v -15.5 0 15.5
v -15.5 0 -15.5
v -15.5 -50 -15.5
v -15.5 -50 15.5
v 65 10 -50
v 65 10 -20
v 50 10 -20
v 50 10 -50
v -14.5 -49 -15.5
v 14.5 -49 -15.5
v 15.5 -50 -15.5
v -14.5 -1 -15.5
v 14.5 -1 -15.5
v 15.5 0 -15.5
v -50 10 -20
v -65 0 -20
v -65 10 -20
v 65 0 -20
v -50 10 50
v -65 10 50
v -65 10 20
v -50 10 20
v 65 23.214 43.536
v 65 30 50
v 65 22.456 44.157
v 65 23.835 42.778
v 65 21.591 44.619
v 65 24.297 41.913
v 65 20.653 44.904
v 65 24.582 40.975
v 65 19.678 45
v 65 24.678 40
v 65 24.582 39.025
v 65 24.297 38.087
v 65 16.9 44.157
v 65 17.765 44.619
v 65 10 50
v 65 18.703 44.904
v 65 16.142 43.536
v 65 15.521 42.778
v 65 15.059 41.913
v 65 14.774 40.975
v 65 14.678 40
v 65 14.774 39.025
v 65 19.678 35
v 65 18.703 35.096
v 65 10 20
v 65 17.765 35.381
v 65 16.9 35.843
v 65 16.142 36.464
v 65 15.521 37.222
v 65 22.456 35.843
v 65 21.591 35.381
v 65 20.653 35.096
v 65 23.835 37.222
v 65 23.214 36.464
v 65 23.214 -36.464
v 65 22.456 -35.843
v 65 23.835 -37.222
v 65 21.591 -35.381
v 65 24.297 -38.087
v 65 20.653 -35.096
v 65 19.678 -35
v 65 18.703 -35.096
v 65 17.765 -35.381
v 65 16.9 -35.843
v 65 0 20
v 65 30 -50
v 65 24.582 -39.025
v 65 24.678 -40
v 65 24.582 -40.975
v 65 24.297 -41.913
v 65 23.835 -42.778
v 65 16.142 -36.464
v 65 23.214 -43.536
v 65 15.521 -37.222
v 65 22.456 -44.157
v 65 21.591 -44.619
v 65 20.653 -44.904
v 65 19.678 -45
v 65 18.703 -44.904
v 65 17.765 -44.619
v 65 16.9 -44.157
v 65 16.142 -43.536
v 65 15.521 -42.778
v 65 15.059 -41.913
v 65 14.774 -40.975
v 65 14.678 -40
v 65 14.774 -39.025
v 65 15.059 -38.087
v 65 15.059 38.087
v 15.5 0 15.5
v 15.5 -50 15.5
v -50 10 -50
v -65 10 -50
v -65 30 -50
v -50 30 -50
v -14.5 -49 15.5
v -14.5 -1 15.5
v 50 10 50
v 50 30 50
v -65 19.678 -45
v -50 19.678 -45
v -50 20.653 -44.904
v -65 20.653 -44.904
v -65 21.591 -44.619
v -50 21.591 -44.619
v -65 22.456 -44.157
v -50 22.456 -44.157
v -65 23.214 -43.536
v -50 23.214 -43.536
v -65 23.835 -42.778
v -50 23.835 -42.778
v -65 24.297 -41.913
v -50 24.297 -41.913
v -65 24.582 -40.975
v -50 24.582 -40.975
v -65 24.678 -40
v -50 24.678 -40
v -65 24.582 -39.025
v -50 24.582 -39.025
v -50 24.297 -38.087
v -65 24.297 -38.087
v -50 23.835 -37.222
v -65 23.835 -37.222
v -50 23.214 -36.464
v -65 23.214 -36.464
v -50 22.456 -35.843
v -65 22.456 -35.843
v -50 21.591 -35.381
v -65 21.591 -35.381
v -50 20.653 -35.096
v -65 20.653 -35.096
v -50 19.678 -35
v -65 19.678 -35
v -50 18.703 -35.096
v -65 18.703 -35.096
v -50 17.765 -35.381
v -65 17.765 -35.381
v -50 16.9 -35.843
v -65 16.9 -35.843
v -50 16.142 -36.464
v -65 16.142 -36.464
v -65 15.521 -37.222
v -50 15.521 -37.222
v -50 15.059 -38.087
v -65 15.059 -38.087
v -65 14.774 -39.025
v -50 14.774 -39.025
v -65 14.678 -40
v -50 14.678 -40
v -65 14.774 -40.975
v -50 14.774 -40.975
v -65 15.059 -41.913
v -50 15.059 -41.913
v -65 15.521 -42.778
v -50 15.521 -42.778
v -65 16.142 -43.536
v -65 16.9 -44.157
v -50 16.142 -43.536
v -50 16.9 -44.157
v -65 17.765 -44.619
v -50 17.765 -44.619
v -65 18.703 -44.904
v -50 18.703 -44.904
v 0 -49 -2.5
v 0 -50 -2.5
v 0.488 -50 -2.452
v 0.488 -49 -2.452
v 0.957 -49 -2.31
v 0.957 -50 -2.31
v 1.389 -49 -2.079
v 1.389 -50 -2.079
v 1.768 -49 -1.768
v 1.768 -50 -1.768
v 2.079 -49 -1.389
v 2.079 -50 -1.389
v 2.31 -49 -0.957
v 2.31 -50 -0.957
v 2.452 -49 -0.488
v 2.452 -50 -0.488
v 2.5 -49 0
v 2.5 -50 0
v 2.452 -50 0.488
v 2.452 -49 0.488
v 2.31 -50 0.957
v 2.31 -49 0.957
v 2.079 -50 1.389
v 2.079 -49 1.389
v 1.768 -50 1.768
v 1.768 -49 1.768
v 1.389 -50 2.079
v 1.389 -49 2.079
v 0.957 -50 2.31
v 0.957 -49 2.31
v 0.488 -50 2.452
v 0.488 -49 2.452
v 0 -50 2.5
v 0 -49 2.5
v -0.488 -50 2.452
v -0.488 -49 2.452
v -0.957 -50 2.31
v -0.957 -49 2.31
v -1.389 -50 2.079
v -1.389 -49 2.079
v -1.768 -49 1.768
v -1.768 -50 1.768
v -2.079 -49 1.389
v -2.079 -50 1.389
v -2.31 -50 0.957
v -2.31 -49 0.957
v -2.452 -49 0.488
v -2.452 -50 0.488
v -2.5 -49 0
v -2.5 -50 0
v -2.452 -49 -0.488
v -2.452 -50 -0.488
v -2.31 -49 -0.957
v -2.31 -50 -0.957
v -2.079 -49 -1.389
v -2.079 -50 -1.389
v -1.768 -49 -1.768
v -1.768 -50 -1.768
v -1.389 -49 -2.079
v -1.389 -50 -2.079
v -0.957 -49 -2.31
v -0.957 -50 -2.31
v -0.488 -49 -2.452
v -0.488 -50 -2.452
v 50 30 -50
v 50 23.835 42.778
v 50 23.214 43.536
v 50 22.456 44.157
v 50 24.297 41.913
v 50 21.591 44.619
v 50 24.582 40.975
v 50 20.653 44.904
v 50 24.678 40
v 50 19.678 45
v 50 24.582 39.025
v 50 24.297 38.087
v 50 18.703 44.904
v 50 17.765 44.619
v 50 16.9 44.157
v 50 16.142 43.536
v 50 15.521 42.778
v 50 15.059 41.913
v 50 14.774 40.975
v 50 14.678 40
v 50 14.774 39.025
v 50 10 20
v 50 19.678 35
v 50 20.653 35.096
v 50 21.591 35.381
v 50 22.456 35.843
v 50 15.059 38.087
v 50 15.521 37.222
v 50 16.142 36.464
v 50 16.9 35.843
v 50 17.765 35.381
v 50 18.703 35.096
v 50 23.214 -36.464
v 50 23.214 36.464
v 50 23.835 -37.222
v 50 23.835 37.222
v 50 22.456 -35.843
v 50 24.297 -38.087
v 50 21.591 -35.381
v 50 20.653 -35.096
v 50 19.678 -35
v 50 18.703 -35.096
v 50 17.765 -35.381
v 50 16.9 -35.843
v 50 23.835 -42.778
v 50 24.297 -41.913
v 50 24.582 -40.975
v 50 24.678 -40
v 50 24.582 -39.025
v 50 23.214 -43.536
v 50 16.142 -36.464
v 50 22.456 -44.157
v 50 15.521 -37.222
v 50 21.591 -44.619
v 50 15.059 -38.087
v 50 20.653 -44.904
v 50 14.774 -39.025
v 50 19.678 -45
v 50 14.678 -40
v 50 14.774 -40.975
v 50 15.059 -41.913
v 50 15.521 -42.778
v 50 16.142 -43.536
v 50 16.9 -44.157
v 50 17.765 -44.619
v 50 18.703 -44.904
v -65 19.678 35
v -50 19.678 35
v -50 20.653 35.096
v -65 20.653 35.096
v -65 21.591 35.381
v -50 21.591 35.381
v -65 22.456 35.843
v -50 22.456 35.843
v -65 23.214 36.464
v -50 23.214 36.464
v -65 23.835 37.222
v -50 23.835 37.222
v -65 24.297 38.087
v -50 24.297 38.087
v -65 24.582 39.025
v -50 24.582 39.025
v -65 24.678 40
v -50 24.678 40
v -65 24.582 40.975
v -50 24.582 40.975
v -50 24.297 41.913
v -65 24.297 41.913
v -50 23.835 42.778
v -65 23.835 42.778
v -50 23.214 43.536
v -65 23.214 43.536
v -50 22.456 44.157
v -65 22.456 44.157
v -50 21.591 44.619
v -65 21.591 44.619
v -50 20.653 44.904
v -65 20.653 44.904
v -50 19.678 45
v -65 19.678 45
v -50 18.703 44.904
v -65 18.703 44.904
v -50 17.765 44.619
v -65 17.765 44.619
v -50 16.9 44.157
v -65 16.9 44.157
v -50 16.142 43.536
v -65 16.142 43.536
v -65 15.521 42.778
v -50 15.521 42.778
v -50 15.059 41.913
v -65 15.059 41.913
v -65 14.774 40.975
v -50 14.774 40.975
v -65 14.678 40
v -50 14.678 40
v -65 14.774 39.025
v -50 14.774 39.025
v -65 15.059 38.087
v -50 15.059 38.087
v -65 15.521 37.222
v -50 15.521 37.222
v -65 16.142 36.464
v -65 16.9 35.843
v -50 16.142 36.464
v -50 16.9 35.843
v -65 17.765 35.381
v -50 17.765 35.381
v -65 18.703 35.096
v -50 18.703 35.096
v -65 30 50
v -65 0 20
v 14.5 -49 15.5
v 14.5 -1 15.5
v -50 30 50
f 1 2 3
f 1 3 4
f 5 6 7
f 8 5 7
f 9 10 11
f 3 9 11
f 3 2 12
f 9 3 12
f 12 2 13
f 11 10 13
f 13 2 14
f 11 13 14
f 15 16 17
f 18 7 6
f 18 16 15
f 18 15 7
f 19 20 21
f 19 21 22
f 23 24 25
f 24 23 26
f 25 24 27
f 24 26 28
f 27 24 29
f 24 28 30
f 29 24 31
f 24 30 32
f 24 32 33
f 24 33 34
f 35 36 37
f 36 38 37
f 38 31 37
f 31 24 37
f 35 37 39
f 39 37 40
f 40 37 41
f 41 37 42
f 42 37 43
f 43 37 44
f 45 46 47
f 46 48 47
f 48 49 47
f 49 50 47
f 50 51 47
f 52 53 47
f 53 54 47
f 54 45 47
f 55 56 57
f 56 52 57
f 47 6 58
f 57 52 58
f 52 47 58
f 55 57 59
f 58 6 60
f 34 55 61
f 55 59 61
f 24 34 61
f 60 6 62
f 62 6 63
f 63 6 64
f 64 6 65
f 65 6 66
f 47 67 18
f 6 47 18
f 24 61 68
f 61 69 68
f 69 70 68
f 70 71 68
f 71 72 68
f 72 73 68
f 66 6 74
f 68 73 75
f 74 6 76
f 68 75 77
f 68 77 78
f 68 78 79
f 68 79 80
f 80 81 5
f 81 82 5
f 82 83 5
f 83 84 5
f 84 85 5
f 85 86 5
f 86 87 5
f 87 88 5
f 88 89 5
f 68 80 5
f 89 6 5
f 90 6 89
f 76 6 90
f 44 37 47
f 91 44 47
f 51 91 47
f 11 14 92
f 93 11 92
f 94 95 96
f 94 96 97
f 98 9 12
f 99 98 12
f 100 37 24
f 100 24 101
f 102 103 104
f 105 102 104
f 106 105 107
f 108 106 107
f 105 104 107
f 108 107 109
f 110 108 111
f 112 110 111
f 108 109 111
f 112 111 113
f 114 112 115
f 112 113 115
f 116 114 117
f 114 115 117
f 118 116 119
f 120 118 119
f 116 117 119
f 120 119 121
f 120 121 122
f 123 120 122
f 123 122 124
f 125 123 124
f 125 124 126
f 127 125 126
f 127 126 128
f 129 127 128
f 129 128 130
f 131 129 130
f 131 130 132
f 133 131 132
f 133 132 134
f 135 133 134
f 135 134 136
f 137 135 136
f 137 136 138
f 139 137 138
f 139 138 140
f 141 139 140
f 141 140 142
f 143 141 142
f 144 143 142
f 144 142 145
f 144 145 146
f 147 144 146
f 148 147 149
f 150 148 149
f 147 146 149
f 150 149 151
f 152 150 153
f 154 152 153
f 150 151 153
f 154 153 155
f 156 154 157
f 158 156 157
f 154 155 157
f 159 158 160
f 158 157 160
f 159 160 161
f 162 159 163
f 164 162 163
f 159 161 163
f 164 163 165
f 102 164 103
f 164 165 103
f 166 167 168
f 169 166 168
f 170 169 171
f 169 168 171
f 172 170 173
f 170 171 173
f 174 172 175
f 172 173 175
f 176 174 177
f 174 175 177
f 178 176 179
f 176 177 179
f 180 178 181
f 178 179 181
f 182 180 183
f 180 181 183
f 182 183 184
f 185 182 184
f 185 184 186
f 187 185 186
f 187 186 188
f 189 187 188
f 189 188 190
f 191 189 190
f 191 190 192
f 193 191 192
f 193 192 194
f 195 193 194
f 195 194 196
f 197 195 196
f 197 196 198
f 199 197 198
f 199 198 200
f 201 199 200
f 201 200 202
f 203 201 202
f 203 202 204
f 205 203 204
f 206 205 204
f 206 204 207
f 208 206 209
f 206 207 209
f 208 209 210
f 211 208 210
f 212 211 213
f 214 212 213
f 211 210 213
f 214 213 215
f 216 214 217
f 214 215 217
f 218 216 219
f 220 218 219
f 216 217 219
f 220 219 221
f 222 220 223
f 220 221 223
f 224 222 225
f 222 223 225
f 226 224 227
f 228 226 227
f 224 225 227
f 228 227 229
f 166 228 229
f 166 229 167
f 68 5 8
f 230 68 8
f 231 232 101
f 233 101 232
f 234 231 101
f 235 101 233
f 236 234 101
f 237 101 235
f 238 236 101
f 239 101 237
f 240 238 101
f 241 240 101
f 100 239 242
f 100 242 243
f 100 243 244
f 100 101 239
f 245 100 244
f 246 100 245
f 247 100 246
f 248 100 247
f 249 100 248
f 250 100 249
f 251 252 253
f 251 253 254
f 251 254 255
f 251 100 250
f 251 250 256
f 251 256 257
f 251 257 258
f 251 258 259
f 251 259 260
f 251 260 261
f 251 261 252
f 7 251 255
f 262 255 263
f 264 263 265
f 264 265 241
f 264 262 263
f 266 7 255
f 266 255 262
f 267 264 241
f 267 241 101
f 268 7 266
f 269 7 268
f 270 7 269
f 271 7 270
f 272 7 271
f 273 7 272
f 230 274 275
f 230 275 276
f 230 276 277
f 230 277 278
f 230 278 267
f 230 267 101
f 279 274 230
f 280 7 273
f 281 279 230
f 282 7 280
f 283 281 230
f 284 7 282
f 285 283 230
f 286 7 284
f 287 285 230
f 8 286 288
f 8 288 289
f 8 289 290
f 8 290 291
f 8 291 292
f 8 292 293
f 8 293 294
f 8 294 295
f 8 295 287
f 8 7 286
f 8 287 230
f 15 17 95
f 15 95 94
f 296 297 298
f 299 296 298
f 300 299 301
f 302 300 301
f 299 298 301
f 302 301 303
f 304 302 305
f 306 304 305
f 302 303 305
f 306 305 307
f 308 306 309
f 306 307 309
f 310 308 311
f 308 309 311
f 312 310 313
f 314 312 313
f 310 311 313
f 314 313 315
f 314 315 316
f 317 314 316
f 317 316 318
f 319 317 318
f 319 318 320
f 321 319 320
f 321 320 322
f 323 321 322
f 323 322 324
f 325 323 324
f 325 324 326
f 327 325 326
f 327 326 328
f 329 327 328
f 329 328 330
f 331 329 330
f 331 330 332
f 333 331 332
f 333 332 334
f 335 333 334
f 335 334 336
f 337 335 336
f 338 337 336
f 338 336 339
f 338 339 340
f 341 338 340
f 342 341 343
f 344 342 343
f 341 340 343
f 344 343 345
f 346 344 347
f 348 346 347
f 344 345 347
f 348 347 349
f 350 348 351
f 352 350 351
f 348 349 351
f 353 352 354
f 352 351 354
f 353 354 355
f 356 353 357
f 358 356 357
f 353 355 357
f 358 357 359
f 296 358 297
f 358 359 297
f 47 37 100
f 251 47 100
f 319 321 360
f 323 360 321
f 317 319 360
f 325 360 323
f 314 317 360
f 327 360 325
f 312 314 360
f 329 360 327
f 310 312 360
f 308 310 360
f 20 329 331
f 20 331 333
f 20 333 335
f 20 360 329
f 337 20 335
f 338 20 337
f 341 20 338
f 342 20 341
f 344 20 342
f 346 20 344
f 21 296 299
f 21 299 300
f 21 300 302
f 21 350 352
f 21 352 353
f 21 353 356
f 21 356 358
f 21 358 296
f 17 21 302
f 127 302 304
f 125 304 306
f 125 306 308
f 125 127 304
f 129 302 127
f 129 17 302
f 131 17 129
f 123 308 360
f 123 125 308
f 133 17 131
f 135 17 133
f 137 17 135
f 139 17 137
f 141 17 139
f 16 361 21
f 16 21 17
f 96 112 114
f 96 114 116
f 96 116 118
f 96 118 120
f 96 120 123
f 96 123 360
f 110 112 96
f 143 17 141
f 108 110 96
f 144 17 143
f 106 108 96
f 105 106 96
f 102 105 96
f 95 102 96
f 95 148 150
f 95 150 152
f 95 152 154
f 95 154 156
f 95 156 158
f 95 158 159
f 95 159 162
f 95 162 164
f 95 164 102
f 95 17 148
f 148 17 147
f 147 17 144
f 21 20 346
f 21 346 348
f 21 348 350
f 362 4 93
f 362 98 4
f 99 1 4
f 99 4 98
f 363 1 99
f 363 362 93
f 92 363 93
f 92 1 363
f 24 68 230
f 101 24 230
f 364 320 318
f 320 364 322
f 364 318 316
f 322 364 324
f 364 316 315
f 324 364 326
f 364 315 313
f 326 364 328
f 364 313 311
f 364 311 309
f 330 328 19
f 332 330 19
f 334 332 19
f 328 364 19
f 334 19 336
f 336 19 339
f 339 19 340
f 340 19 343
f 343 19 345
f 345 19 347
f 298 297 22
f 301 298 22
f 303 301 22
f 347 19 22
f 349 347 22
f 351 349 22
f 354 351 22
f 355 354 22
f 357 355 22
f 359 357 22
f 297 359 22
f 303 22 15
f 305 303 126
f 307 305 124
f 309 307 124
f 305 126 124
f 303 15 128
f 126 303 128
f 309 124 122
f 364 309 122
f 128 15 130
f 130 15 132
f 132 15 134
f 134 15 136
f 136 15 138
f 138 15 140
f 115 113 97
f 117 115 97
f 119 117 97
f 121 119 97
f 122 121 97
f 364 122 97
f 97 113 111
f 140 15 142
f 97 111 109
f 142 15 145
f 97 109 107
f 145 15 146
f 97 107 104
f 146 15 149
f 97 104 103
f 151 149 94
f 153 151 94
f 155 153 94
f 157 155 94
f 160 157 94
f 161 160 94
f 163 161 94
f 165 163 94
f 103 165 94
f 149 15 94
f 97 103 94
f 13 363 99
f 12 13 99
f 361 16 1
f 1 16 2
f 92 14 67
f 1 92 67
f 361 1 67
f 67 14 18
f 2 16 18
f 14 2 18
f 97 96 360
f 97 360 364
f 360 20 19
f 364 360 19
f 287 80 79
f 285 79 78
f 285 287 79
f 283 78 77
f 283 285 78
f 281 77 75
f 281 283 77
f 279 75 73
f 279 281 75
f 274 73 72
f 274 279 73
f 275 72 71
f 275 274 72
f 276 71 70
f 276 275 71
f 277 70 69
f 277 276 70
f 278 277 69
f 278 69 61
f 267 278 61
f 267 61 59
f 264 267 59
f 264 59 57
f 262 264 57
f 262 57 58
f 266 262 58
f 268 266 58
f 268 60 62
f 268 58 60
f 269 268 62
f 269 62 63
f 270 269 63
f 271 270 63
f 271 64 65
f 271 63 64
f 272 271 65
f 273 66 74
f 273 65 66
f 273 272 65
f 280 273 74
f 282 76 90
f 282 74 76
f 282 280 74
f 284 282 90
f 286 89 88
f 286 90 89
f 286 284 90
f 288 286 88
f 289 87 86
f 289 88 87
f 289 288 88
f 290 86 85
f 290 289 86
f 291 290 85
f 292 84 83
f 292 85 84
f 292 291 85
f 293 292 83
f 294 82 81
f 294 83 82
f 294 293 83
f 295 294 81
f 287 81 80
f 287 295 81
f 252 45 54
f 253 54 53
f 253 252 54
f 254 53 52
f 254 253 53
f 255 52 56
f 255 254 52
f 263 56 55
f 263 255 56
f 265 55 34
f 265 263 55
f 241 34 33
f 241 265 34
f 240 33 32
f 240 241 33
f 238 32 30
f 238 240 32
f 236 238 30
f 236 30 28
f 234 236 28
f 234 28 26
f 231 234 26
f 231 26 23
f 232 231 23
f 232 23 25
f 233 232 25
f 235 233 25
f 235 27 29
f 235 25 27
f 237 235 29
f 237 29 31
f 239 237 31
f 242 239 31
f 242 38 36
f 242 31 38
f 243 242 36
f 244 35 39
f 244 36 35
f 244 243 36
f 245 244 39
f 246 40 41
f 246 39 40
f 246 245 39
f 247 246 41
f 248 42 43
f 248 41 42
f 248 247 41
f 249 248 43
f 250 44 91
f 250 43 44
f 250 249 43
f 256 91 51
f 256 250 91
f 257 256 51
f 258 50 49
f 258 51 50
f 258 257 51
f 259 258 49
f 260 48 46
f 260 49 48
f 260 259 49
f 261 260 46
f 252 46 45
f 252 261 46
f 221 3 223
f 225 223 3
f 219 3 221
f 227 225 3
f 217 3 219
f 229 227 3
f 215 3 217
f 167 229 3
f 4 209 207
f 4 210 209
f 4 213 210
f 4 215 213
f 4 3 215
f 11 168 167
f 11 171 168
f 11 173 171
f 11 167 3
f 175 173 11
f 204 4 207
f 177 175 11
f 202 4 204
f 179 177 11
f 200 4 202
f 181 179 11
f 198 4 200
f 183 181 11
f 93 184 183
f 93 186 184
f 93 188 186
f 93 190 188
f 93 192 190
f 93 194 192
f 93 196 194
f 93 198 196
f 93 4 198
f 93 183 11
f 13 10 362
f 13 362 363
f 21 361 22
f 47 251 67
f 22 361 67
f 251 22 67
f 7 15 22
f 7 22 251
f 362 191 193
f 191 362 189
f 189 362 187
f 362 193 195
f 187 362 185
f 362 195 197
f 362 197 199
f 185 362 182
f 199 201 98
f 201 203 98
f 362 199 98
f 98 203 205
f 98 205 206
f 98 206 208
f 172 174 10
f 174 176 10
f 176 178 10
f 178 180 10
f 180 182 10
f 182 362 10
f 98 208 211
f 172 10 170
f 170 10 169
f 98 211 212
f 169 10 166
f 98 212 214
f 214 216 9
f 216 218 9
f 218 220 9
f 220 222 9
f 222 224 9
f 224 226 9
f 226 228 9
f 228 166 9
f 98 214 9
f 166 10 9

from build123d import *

# Parameters (mm, degrees)
SKETCH1_W           = 130
SKETCH1_H           = 40
BOSS_EXTRUDE1_DEPTH = 10
SKETCH3_W           = 31
SKETCH3_H           = 31
BOSS_EXTRUDE3_DEPTH = 50
SKETCH4_W           = 29
SKETCH4_H           = 48
CUT_EXTRUDE1_DEPTH  = 90.360226052
CUT_EXTRUDE2_REACH  = 92.692
SKETCH5_R           = 2.5
SKETCH2_W           = 15
SKETCH2_H           = 100
BOSS_EXTRUDE4_DEPTH = 20
SKETCH6_R           = 5
CUT_EXTRUDE3_DEPTH  = 20


with BuildPart() as part:
    # Sketch1 → Boss-Extrude1 (new body)
    with BuildSketch(Plane(origin=(0, 0, 0), x_dir=(1, 0, 0), z_dir=(0, 1, 0))):
        Rectangle(SKETCH1_W, SKETCH1_H)
    extrude(amount=BOSS_EXTRUDE1_DEPTH)

    # Sketch3 → Boss-Extrude3 (add)
    with BuildSketch(Plane.XZ):
        Rectangle(SKETCH3_W, SKETCH3_H)
    extrude(amount=BOSS_EXTRUDE3_DEPTH)

    # Sketch4 → Cut-Extrude1 (cut, through all)
    with BuildSketch(Plane(origin=(0, 0, -15.5), x_dir=(-1, 0, 0), z_dir=(0, 0, -1))):
        with Locations((0, -25)):
            Rectangle(SKETCH4_W, SKETCH4_H)
    extrude(amount=-CUT_EXTRUDE1_DEPTH, mode=Mode.SUBTRACT)

    # Sketch5 → Cut-Extrude2 (cut, up to next)
    with BuildSketch(Plane.XZ.offset(50), mode=Mode.PRIVATE) as cut_extrude2_sk1:
        Circle(SKETCH5_R)
    cut_extrude2_tool1 = extrude(cut_extrude2_sk1.sketch, amount=-CUT_EXTRUDE2_REACH, mode=Mode.PRIVATE) & part.part
    add(cut_extrude2_tool1.solids().sort_by_distance((0, -50, 0))[0], mode=Mode.SUBTRACT)

    # Sketch2 → Boss-Extrude4 (add)
    with BuildSketch(Plane(origin=(0, 10, 0), x_dir=(1, 0, 0), z_dir=(0, 1, 0))):
        with Locations((-57.5, 0)):
            Rectangle(SKETCH2_W, SKETCH2_H)
    boss_extrude4 = extrude(amount=BOSS_EXTRUDE4_DEPTH)

    # Sketch6 → Cut-Extrude3 (cut)
    with BuildSketch(Plane(origin=(-50, 0, 0), x_dir=(0, 0, -1), z_dir=(1, 0, 0))):
        with Locations((-40, 19.678033473)):
            Circle(SKETCH6_R)
        with Locations((40, 19.678033473)):
            Circle(SKETCH6_R)
    cut_extrude3 = extrude(amount=-CUT_EXTRUDE3_DEPTH, mode=Mode.SUBTRACT)

    # Mirror1: Boss-Extrude4, Cut-Extrude3 across plane
    add(boss_extrude4.mirror(Plane(origin=(0, 0, 0), x_dir=(0, 0, 1), z_dir=(1, 0, 0))))
    add(cut_extrude3.mirror(Plane(origin=(0, 0, 0), x_dir=(0, 0, 1), z_dir=(1, 0, 0))), mode=Mode.SUBTRACT)


solid = part.part
